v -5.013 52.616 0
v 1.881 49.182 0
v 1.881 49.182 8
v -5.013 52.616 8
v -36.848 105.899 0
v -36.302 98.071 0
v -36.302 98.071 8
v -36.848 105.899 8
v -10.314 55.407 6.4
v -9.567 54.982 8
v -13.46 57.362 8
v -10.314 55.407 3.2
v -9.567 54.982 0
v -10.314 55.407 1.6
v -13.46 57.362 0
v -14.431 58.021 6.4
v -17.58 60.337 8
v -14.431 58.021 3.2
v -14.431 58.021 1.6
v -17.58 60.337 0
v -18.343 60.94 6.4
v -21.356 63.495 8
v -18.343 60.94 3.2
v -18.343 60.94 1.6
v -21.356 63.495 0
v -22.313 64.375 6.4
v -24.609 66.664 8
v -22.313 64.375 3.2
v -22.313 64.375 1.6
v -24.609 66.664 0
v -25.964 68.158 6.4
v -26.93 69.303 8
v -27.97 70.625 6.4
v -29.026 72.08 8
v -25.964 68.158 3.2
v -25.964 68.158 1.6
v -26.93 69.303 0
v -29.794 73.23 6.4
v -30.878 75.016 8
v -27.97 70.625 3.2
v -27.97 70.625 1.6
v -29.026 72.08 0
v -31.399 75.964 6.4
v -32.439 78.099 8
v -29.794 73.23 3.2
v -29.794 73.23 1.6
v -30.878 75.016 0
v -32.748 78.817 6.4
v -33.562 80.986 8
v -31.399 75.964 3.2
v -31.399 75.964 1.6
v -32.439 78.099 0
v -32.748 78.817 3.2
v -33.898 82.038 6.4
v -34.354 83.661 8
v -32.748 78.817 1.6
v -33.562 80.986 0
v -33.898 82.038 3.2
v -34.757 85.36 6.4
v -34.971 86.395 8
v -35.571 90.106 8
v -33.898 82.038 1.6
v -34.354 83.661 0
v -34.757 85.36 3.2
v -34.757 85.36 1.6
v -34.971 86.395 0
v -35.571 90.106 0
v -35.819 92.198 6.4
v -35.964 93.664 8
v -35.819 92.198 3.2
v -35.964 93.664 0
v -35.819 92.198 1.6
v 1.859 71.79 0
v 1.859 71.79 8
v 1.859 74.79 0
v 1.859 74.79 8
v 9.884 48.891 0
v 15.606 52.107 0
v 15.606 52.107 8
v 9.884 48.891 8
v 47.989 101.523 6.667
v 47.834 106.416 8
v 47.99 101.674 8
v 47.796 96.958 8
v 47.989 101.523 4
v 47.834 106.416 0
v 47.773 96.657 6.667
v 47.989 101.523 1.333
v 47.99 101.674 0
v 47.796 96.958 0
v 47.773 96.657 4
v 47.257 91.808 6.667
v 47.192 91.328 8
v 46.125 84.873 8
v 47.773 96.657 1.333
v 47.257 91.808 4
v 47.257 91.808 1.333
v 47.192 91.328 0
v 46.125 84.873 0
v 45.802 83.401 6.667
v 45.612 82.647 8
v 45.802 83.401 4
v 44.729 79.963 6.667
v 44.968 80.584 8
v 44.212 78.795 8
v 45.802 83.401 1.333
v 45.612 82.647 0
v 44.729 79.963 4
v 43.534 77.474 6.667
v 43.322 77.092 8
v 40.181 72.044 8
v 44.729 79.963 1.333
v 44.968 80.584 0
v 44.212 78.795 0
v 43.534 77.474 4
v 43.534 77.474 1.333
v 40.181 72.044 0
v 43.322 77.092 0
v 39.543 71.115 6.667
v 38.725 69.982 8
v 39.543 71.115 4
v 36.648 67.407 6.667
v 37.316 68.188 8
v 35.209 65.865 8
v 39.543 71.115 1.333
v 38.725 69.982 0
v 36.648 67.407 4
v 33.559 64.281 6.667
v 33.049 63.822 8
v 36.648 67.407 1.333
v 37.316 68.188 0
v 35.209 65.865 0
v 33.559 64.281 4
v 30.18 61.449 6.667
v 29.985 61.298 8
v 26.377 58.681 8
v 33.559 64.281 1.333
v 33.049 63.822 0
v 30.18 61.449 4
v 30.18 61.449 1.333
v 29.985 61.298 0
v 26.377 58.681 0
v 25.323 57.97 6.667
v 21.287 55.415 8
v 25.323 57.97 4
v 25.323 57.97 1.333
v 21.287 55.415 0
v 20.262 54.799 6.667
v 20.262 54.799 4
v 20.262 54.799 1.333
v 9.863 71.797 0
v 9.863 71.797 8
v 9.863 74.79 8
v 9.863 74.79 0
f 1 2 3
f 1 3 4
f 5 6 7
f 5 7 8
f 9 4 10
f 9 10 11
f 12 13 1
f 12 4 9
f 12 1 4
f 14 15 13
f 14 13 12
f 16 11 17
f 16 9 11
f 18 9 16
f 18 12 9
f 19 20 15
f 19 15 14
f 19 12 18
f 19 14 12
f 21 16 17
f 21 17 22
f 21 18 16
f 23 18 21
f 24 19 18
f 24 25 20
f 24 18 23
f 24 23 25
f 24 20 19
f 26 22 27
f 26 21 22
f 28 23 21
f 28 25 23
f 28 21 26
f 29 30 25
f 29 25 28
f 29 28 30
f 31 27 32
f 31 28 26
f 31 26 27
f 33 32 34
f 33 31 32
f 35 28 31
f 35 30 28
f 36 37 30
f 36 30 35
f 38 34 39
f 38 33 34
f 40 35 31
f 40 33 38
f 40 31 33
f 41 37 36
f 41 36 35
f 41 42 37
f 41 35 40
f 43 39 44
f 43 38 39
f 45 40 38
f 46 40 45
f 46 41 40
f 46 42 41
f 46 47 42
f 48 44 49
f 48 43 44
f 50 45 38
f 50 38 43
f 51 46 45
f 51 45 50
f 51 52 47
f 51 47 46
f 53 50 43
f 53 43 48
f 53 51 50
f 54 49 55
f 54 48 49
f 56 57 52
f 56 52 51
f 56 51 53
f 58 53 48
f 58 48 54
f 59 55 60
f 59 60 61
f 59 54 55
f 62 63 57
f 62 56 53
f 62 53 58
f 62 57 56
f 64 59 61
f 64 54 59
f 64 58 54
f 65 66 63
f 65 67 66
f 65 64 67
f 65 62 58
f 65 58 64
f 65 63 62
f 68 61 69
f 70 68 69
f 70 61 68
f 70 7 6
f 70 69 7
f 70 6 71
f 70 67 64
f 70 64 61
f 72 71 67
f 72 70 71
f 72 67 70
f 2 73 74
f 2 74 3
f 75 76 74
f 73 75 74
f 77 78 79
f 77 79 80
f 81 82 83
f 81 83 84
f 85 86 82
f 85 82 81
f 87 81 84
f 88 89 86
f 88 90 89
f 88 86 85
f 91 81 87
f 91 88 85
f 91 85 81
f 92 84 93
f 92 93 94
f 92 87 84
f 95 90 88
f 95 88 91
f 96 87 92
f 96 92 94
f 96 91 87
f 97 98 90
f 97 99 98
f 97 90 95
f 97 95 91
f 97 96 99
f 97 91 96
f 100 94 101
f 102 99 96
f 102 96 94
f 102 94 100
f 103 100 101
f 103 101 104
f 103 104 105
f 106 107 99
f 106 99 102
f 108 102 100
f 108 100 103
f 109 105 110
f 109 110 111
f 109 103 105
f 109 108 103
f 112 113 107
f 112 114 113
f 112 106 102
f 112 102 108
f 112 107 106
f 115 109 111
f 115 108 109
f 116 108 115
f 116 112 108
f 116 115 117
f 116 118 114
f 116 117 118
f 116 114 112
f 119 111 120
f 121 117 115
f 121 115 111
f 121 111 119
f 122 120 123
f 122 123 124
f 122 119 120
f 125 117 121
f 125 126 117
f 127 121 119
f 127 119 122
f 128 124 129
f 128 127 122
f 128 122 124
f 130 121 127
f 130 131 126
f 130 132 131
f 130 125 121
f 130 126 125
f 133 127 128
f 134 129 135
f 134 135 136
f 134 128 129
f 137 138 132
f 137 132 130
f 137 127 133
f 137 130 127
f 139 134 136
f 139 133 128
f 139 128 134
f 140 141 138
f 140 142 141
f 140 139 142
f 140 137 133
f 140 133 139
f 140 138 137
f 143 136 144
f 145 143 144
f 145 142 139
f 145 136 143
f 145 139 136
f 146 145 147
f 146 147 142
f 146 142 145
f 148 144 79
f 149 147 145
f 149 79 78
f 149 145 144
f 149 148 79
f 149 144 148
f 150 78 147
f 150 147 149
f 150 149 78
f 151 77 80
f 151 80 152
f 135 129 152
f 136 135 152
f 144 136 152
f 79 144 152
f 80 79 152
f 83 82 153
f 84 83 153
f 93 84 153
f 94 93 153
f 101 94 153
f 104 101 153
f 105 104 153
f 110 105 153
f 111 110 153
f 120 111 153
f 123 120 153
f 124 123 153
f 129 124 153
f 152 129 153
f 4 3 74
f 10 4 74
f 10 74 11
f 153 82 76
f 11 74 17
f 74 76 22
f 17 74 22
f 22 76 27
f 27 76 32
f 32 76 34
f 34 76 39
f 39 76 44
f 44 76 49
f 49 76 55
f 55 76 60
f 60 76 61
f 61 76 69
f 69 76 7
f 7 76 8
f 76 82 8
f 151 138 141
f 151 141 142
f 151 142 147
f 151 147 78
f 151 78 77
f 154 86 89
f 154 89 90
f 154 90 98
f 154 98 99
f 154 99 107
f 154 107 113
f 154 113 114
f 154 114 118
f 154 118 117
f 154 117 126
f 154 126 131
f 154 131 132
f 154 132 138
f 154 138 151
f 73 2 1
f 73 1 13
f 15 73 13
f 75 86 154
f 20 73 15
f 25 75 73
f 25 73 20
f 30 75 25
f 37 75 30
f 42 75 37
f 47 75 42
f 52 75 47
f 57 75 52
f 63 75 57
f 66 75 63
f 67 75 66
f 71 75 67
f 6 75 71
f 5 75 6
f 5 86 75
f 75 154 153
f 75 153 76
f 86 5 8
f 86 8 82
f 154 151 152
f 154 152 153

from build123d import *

# Parameters (mm, degrees)
EXTRUDE_1_DEPTH = 8


with BuildPart() as part:
    # 草图1 → 凸台-拉伸1 (new body)
    with BuildSketch(Plane.XY):
        with BuildLine():
            Line((9.884140627, 48.890967478), (9.862592606, 71.797167618))
            Line((9.862592606, 71.797167618), (9.862592606, 74.789638905))
            Line((9.862592606, 74.789638905), (1.859342158, 74.789638905))
            Line((1.859342158, 74.789638905), (1.859342158, 71.789638905))
            Line((1.859342158, 71.789638905), (1.880609299, 49.182021359))
            add(Edge.make_bspline(
                [(1.880609299, 49.182021359), (-2.147543525, 51.320103541), (-9.368620539, 54.40588996), (-18.684466246, 60.920686929), (-26.75654301, 68.367940859), (-36.33720868, 82.740540116), (-36.066485806, 97.042827626), (-36.847635358, 105.899002406)],
                knots=[0, 0, 0, 0, 0.18493282, 0.316628253, 0.458400557, 0.629057108, 1, 1, 1, 1], degree=3))
            Line((-36.847635358, 105.899002406), (47.833660698, 106.415821201))
            add(Edge.make_bspline(
                [(47.833660698, 106.415821201), (48.319473241, 99.869034947), (47.370463287, 91.039903293), (45.267329493, 80.35246618), (41.497074055, 73.927784135), (37.087778724, 67.31022324), (26.486440292, 57.93257211), (16.797369064, 52.799383097), (9.884140627, 48.890967478)],
                knots=[0, 0, 0, 0, 0.262570007, 0.359675169, 0.434109376, 0.560787033, 0.678988213, 1, 1, 1, 1], degree=3))
        make_face()
    extrude(amount=EXTRUDE_1_DEPTH)


solid = part.part
